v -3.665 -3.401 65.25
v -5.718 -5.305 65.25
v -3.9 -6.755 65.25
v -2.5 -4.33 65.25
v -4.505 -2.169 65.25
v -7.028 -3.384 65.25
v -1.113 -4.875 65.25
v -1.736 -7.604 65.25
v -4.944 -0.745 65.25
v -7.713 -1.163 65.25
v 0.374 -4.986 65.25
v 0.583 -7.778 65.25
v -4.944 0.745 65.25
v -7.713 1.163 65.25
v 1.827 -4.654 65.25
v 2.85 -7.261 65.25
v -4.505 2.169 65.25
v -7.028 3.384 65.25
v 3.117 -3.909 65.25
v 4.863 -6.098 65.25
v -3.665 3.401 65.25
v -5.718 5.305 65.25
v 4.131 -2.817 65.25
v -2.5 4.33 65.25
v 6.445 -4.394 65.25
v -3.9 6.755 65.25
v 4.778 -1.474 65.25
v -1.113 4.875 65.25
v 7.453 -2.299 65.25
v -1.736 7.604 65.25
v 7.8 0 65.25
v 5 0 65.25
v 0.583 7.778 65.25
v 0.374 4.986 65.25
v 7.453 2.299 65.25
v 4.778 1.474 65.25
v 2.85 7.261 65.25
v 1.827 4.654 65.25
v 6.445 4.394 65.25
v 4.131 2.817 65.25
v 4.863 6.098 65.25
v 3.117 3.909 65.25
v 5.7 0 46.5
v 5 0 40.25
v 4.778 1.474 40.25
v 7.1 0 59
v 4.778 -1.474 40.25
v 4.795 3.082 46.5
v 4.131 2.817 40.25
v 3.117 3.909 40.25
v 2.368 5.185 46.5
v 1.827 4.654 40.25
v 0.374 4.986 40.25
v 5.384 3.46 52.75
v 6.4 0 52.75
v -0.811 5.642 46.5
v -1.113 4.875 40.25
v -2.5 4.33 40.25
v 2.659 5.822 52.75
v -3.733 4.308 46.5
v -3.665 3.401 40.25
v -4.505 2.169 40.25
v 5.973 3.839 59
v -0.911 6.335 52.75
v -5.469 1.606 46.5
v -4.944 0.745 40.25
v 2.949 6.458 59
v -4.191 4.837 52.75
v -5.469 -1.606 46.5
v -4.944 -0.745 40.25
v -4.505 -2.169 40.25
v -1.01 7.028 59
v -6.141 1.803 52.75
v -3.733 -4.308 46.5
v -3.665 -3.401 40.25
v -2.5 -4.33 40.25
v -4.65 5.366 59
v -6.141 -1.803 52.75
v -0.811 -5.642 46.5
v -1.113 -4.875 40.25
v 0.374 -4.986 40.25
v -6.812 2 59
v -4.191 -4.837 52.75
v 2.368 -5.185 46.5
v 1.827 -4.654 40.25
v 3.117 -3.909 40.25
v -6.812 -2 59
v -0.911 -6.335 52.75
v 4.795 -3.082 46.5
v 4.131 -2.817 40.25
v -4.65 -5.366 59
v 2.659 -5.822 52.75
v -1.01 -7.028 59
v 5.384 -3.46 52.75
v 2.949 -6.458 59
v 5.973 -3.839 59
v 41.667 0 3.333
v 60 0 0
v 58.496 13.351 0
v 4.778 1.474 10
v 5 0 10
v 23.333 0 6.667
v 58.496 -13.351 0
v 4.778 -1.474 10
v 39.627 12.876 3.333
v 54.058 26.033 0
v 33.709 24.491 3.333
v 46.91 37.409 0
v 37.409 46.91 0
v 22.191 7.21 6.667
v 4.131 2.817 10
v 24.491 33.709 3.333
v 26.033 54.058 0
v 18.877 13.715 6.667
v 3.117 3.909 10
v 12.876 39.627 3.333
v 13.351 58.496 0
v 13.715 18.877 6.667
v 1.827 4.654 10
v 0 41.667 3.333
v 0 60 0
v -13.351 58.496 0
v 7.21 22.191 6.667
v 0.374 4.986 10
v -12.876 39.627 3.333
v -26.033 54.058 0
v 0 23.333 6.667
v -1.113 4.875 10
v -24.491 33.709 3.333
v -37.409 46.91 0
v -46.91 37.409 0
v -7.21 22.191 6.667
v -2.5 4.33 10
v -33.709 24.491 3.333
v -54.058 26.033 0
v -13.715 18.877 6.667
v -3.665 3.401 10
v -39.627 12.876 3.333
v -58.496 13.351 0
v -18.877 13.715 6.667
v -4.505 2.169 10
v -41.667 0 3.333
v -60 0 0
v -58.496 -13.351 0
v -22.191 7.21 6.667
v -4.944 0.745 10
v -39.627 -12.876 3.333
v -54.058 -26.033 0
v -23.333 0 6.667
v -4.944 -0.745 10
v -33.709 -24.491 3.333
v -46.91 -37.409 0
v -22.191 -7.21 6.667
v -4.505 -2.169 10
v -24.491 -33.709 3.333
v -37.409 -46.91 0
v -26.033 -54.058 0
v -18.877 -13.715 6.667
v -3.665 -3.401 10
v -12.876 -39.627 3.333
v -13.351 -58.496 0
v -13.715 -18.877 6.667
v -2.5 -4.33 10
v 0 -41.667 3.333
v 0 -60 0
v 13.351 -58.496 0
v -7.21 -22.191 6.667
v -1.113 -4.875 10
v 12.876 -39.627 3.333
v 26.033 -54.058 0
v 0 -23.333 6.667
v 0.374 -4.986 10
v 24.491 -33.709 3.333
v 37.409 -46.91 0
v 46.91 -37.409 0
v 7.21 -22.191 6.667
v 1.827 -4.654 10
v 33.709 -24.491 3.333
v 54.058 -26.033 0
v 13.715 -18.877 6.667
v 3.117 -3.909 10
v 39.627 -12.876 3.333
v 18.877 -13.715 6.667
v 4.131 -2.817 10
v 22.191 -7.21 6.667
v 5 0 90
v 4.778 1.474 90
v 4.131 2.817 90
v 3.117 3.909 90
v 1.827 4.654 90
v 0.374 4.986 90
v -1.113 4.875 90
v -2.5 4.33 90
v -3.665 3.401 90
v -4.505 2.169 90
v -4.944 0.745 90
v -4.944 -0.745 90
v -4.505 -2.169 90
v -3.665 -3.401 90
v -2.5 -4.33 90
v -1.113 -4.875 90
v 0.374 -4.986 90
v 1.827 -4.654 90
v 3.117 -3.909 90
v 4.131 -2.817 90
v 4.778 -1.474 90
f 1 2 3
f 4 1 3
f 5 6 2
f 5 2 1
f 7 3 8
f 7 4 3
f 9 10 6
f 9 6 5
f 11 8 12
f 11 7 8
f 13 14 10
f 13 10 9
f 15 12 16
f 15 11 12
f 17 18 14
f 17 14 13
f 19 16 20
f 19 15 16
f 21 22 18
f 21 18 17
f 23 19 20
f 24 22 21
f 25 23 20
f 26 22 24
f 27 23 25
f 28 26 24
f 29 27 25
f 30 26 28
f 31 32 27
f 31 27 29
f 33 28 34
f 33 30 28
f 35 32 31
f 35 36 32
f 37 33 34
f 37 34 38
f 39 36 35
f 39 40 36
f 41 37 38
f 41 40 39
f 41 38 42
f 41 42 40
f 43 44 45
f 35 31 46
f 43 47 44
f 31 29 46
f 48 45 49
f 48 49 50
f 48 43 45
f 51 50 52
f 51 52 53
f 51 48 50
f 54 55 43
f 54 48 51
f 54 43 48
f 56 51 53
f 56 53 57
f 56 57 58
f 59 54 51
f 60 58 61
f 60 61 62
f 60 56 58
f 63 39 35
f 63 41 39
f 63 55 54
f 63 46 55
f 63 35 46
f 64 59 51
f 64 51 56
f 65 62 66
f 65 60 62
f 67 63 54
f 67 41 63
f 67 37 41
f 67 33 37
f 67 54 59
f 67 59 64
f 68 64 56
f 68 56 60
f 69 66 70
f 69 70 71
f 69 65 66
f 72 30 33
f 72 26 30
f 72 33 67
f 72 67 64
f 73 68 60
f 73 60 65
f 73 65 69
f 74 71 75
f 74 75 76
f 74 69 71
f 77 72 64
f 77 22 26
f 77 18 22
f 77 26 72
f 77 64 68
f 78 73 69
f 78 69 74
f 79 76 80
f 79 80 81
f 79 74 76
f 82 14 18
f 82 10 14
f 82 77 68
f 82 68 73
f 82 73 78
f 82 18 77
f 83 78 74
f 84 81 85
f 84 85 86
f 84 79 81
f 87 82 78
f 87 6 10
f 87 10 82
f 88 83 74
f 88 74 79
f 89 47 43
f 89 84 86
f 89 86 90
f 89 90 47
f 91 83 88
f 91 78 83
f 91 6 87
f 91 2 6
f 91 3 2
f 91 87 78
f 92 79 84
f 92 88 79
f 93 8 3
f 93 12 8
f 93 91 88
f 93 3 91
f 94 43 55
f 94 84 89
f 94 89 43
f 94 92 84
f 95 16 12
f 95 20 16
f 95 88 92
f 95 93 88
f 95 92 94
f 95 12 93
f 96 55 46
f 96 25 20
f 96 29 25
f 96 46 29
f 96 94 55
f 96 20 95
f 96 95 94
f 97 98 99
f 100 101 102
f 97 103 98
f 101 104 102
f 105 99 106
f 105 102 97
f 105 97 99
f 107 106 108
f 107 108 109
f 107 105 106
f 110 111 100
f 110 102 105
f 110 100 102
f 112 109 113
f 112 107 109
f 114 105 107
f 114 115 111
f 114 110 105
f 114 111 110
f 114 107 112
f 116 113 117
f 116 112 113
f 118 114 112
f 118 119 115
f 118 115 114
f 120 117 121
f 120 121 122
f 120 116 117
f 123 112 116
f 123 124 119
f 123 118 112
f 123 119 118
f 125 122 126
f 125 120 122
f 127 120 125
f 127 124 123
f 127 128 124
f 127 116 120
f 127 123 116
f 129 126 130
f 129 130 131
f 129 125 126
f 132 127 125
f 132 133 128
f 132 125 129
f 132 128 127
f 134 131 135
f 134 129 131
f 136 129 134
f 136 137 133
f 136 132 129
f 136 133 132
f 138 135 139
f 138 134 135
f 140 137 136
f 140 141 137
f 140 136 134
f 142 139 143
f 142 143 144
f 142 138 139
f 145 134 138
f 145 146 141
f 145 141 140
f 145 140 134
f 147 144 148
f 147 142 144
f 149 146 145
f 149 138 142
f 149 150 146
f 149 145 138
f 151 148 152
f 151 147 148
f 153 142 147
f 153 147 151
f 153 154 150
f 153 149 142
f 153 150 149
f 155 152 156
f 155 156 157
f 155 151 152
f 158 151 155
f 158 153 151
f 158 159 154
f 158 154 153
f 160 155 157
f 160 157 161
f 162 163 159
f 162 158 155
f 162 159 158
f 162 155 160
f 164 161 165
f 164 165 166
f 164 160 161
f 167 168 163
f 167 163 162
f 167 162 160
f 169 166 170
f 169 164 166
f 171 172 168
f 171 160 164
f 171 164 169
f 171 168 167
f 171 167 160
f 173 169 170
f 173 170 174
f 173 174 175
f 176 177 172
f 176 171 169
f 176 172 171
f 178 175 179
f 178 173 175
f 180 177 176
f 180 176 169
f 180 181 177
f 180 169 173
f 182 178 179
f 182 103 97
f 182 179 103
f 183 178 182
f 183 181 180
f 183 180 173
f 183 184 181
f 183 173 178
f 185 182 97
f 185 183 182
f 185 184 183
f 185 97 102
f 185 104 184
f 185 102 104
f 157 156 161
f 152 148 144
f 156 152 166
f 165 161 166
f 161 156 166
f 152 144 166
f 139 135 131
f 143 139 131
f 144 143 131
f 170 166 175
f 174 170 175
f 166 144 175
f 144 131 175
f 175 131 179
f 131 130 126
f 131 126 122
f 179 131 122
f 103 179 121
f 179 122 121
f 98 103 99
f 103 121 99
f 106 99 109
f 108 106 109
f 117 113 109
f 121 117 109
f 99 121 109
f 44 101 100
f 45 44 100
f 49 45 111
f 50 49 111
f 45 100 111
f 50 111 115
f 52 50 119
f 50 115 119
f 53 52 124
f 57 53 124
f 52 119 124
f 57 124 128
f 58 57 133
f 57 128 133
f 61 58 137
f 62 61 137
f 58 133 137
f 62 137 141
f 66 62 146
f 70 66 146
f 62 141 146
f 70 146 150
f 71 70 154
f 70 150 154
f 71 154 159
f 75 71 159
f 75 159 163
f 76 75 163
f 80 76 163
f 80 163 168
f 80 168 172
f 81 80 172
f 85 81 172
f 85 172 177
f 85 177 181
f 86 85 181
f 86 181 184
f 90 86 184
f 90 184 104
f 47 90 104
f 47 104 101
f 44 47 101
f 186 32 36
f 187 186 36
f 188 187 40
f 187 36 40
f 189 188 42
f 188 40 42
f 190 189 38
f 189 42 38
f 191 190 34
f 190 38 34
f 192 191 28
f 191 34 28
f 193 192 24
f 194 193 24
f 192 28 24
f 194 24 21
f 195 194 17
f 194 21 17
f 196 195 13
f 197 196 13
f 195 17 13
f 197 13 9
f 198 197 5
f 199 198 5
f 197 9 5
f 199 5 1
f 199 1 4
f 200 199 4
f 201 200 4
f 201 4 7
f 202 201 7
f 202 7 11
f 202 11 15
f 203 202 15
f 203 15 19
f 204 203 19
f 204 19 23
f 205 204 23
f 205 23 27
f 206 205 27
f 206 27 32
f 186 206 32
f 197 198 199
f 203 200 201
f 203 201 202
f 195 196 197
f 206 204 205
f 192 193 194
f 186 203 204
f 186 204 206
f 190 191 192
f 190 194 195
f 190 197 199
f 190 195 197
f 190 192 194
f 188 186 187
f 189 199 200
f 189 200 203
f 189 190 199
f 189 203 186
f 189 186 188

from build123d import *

# Parameters (mm, degrees)
F2_R      = 5
F3_DEPTH  = 80
F0_R      = 60
F3_FACE_R = 5
F8_R      = 5
F6_R      = 7.8


with BuildPart() as f3:
    # F2 (on offset) → F3 (new body)
    with BuildSketch(Plane.XY.offset(10)):
        Circle(F2_R)
    extrude(amount=F3_DEPTH)

    # F0 (on Top) → F4 section 0
    with BuildSketch(Plane.XY):
        Circle(F0_R)
    # F3_face (on face) → F4 section 1
    with BuildSketch(Plane(origin=(0, 0, 10), x_dir=(1, 0, 0), z_dir=(0, 0, -1))):
        Circle(F3_FACE_R)
    loft()

    # F8 (on offset) → F9 section 0
    with BuildSketch(Plane.XY.offset(40.25)):
        Circle(F8_R)
    # F6 (on offset) → F9 section 1
    with BuildSketch(Plane.XY.offset(65.25)):
        Circle(F6_R)
    loft()


solid = f3.part
